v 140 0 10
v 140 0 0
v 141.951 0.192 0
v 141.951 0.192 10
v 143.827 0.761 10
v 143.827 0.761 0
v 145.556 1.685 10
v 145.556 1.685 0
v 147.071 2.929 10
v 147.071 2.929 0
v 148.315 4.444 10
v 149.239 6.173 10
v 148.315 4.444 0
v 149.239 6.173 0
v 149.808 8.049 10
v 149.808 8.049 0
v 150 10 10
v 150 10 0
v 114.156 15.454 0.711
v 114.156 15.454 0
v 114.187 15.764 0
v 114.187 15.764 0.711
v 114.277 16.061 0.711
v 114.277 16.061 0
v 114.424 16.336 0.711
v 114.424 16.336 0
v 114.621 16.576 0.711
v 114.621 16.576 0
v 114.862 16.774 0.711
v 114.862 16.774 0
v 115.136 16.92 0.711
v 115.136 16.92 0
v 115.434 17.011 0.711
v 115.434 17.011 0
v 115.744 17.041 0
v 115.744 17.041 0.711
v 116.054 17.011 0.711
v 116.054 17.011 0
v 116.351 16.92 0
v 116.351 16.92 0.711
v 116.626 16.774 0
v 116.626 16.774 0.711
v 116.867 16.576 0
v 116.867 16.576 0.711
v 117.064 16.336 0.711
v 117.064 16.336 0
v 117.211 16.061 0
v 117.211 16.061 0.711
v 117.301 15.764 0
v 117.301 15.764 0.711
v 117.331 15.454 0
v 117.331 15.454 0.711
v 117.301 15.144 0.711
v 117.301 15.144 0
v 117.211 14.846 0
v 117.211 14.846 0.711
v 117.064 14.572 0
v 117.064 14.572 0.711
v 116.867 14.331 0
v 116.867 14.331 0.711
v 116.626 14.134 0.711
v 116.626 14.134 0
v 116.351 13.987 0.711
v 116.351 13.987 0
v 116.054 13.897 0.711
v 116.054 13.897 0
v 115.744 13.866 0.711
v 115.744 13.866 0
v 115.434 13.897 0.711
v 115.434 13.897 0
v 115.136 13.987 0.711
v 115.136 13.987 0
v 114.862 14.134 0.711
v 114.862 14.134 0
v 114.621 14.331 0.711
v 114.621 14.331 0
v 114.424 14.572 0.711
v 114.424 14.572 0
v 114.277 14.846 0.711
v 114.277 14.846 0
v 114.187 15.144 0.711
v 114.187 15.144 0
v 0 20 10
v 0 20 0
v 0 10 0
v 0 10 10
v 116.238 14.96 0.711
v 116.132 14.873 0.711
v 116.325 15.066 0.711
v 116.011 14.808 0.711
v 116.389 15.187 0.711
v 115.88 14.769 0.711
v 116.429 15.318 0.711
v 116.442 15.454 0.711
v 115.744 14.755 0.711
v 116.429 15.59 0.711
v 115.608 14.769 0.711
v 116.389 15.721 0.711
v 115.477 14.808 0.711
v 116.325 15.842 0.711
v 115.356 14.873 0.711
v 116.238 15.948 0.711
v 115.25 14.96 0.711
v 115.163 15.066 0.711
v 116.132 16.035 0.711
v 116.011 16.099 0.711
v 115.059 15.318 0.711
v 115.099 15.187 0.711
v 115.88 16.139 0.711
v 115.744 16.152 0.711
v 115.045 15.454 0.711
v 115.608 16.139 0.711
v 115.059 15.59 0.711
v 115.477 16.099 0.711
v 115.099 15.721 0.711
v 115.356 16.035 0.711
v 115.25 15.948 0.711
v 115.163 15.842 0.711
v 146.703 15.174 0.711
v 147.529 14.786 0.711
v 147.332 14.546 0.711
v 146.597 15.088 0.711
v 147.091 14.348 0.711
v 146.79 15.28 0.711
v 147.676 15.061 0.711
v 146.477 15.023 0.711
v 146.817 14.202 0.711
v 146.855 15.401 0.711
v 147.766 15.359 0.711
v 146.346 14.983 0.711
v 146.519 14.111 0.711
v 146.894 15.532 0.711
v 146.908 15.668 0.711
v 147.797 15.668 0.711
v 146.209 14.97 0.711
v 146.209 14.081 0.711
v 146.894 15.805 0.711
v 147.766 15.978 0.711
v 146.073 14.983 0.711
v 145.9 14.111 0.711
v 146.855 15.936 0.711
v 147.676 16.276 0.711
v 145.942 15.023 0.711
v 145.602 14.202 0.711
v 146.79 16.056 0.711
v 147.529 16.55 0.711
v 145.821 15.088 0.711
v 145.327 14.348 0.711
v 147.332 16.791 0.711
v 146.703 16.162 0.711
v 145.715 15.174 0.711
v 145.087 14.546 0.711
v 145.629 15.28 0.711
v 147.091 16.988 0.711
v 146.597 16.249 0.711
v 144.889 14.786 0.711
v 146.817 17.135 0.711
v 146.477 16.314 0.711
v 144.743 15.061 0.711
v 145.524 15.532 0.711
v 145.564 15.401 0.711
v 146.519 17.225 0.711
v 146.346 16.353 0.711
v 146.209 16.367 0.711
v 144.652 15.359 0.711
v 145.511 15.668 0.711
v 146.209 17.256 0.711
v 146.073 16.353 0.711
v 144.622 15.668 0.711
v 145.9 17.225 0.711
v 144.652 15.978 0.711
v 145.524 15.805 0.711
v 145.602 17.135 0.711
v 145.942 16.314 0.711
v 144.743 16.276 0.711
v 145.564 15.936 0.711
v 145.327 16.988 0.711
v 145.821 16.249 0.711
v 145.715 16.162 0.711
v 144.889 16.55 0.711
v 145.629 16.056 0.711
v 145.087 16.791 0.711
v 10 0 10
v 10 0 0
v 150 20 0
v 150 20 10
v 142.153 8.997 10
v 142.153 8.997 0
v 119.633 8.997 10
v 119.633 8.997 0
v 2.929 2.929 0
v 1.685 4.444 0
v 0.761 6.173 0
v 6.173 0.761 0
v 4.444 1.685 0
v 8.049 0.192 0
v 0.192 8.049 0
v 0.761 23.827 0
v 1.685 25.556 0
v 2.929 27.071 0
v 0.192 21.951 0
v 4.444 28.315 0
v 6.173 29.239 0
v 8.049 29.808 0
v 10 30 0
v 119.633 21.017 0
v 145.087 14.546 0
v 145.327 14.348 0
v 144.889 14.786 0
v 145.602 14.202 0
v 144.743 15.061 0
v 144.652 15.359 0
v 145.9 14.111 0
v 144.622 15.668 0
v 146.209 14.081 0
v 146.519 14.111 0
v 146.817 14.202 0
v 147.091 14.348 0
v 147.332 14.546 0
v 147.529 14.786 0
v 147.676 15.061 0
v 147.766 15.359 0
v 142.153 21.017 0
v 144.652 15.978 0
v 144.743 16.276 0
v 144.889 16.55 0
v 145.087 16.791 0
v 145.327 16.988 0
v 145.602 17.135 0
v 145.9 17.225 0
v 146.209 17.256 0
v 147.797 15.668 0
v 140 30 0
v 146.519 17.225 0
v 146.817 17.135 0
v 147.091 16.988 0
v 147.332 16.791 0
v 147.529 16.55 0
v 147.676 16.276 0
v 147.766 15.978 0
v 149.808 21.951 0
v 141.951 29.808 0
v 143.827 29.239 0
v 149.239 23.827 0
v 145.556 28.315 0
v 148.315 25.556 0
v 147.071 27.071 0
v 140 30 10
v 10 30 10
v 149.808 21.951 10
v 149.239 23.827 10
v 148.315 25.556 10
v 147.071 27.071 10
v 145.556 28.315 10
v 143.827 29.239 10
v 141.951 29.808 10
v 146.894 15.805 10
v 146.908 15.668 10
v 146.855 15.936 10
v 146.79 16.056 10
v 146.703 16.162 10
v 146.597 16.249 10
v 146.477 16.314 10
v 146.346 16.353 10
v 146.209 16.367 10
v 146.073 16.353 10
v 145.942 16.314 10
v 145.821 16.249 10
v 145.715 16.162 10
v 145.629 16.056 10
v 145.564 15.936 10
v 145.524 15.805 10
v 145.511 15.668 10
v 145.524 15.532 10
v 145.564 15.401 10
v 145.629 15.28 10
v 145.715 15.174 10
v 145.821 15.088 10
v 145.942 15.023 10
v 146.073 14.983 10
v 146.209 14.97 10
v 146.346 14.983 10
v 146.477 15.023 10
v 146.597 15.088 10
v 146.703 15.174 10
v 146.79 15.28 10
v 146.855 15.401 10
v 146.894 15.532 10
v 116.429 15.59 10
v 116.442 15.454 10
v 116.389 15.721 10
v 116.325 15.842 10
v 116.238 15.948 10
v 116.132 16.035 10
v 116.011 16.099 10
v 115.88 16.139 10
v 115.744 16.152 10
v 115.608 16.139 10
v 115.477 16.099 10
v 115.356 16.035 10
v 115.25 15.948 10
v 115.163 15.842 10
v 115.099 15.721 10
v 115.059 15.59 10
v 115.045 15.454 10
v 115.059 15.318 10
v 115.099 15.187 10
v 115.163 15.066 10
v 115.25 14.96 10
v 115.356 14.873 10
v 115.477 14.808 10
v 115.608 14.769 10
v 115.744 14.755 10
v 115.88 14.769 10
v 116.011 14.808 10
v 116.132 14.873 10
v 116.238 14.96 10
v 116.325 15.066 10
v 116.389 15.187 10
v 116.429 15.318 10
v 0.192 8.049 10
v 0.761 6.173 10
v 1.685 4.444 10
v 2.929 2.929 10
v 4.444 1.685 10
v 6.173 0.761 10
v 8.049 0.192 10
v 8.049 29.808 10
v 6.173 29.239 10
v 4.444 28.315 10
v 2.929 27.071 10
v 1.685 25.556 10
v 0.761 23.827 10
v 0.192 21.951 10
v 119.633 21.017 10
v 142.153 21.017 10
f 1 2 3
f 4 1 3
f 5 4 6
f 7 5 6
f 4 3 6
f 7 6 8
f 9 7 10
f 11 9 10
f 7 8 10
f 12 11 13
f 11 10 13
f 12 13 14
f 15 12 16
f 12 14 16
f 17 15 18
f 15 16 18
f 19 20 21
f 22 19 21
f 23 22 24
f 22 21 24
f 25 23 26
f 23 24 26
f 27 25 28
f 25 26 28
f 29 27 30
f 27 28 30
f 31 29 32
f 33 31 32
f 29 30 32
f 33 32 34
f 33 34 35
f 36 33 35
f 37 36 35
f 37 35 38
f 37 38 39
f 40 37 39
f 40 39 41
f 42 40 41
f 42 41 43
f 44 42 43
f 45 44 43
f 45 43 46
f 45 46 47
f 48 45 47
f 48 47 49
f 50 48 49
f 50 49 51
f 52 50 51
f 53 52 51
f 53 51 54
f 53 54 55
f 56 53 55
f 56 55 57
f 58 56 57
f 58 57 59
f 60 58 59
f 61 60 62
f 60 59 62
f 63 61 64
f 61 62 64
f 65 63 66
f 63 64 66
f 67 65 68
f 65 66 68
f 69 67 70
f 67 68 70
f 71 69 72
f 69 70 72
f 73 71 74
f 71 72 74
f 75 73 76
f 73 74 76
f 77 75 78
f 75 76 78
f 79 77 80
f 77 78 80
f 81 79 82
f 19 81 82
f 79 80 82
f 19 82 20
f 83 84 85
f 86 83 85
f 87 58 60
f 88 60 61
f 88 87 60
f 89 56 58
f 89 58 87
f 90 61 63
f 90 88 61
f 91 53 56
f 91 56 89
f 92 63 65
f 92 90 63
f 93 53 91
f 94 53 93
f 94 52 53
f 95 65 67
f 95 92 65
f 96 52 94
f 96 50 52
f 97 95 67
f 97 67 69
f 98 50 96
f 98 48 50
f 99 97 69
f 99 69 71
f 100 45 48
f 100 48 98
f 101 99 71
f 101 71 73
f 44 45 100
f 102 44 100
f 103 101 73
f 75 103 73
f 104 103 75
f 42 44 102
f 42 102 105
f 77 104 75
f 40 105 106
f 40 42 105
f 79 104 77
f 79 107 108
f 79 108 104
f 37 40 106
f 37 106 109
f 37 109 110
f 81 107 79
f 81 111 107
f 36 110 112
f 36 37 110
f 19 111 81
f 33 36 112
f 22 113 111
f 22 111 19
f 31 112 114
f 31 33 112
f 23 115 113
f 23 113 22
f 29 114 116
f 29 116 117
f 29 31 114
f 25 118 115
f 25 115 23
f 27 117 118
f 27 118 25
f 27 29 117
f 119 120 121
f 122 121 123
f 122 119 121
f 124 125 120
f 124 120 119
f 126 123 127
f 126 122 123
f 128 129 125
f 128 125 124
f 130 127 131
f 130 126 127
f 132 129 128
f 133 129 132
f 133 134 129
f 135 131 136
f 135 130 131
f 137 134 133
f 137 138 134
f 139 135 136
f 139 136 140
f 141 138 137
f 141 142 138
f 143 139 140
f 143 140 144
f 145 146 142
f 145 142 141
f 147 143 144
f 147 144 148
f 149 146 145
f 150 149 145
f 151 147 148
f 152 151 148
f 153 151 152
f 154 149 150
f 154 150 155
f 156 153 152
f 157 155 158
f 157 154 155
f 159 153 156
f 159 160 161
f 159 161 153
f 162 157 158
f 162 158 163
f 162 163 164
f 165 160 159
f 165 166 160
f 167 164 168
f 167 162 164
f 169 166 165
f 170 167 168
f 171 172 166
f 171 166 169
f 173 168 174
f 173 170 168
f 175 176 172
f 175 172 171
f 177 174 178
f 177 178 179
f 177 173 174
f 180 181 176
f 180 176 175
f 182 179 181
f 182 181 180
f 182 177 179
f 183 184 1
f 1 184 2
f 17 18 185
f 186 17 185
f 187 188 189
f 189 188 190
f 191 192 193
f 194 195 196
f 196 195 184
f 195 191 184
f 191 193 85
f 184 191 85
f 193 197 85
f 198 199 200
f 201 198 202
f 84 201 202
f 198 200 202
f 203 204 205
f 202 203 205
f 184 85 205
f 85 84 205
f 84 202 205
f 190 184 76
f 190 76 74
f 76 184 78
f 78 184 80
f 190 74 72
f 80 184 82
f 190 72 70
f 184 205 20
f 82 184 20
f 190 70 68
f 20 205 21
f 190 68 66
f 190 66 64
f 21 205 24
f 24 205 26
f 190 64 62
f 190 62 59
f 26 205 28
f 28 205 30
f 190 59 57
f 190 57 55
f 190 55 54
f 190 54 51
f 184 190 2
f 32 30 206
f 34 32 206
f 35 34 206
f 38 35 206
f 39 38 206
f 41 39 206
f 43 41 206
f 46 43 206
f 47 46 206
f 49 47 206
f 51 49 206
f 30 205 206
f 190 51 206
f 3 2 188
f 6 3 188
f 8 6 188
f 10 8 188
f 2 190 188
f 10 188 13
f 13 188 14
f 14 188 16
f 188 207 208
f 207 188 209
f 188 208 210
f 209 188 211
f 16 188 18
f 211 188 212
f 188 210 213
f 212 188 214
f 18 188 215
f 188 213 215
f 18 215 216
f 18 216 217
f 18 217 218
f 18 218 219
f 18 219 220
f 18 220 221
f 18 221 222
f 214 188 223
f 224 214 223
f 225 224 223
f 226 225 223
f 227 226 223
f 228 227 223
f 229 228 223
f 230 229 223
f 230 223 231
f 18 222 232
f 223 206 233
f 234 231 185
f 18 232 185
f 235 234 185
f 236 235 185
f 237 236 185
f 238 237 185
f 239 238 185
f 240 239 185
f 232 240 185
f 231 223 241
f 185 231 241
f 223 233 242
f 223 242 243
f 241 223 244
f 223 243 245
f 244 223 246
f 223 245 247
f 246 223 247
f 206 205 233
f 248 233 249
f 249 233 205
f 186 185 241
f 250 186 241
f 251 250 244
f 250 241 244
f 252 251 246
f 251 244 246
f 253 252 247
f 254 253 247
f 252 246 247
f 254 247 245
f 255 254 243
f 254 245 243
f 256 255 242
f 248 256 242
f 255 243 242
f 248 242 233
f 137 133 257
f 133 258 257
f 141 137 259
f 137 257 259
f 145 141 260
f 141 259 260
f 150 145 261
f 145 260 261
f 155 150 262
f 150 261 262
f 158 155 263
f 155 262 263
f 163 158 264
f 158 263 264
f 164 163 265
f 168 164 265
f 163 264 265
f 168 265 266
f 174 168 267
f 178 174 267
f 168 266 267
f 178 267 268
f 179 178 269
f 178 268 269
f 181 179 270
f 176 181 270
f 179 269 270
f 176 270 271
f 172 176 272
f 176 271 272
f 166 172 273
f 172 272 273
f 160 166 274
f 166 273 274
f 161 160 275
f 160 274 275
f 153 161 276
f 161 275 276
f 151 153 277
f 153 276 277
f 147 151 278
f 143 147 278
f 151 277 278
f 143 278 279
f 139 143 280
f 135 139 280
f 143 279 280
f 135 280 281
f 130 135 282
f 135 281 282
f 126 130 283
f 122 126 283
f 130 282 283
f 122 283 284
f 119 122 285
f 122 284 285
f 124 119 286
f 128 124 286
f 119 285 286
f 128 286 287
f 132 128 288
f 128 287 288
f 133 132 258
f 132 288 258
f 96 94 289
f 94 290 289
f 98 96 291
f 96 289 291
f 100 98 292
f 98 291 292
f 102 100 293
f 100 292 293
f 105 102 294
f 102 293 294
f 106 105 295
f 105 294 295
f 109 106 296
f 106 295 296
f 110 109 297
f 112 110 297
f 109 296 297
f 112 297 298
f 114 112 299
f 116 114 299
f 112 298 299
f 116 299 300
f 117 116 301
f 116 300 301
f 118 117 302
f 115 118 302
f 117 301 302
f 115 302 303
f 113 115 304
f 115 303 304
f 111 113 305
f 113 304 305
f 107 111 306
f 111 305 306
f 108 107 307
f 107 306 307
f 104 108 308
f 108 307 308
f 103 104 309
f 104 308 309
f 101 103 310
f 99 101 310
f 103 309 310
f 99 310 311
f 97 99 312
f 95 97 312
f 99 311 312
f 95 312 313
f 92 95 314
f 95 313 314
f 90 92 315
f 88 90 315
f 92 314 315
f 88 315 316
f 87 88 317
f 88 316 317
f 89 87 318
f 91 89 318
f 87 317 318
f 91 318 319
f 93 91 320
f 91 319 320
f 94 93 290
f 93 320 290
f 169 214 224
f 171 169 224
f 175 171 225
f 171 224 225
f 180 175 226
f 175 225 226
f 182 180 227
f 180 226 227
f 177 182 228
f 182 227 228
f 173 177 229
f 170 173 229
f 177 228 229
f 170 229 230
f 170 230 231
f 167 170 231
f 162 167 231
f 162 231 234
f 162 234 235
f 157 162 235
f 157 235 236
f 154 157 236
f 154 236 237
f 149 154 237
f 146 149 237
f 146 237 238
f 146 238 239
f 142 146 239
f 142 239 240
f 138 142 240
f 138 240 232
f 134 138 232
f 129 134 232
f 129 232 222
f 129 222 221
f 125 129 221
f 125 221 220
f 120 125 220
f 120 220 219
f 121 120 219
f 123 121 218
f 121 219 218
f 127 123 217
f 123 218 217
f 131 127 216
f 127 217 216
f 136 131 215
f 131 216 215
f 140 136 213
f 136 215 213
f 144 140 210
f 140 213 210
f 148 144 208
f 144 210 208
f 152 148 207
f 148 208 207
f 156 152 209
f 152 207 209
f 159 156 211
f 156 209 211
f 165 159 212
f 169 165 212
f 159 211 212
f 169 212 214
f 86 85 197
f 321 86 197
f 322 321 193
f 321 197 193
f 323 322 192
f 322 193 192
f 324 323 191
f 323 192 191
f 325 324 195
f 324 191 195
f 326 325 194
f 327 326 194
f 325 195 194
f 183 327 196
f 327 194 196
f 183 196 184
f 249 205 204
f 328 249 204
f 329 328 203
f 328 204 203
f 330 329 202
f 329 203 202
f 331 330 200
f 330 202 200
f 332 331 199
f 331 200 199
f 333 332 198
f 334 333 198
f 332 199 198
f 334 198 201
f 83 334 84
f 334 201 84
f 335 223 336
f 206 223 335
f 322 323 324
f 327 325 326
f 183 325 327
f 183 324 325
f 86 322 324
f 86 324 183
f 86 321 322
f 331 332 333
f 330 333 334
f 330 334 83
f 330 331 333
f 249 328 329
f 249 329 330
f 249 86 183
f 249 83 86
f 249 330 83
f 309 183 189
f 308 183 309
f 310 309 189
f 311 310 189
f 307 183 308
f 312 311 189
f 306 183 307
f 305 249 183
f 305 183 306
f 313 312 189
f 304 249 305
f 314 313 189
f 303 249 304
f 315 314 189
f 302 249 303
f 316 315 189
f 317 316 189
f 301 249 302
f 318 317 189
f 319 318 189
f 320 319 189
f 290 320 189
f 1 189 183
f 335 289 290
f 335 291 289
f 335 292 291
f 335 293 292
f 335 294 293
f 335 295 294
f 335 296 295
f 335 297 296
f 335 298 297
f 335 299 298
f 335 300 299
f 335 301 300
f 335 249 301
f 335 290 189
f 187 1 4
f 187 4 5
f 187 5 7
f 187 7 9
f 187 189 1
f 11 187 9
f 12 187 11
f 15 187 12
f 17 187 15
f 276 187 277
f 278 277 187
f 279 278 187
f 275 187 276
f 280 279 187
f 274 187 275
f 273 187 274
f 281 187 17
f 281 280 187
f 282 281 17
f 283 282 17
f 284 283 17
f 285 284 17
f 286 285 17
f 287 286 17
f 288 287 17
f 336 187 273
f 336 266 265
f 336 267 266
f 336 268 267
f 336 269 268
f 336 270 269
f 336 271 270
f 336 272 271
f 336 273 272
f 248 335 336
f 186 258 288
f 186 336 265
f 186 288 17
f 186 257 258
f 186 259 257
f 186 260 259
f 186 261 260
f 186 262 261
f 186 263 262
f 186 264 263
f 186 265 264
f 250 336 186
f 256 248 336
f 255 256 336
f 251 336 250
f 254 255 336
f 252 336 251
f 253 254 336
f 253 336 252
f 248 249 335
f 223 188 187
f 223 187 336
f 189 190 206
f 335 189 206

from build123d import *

# Parameters (mm, degrees)
BOSS_EXTRUDE1_DEPTH                                 = 10
SKETCH2_W                                           = 22.52
SKETCH2_H                                           = 12.02
CUT_EXTRUDE1_DEPTH                                  = 154.297097168
CBORE_FOR_00_BINDING_HEAD_MACHINE_SCREW_D           = 1.397
CBORE_FOR_00_BINDING_HEAD_MACHINE_SCREW_CBORE_D     = 3.175
CBORE_FOR_00_BINDING_HEAD_MACHINE_SCREW_CBORE_DEPTH = 0.7112


with BuildPart() as part:
    # Sketch1 → Boss-Extrude1 (new body)
    with BuildSketch(Plane.XY):
        with BuildLine():
            Line((10, 0), (140, 0))
            ThreePointArc((140, 0), (147.071067812, 2.928932188), (150, 10))
            Line((150, 10), (150, 20))
            ThreePointArc((150, 20), (147.071067812, 27.071067812), (140, 30))
            Line((140, 30), (10, 30))
            ThreePointArc((10, 30), (2.928932188, 27.071067812), (0, 20))
            Line((0, 20), (0, 10))
            ThreePointArc((0, 10), (2.928932188, 2.928932188), (10, 0))
        make_face()
    extrude(amount=BOSS_EXTRUDE1_DEPTH)

    # Sketch2 → Cut-Extrude1 (cut, through all)
    with BuildSketch(Plane(origin=(0, 0, 0), x_dir=(-1, 0, 0), z_dir=(0, 0, -1))):
        with Locations((-130.892658662, 15.006569468)):
            Rectangle(SKETCH2_W, SKETCH2_H)
    extrude(amount=-CUT_EXTRUDE1_DEPTH, mode=Mode.SUBTRACT)

    # CBORE for #00 Binding Head Machine Screw3 (through all)
    with Locations(Plane(origin=(0, 0, 0), x_dir=(-1, 0, 0), z_dir=(0, 0, -1))):
        with Locations((-146.209359197, 15.668360935), (-115.743972015, 15.453815955)):
            CounterBoreHole(CBORE_FOR_00_BINDING_HEAD_MACHINE_SCREW_D / 2, CBORE_FOR_00_BINDING_HEAD_MACHINE_SCREW_CBORE_D / 2, CBORE_FOR_00_BINDING_HEAD_MACHINE_SCREW_CBORE_DEPTH)


solid = part.part
